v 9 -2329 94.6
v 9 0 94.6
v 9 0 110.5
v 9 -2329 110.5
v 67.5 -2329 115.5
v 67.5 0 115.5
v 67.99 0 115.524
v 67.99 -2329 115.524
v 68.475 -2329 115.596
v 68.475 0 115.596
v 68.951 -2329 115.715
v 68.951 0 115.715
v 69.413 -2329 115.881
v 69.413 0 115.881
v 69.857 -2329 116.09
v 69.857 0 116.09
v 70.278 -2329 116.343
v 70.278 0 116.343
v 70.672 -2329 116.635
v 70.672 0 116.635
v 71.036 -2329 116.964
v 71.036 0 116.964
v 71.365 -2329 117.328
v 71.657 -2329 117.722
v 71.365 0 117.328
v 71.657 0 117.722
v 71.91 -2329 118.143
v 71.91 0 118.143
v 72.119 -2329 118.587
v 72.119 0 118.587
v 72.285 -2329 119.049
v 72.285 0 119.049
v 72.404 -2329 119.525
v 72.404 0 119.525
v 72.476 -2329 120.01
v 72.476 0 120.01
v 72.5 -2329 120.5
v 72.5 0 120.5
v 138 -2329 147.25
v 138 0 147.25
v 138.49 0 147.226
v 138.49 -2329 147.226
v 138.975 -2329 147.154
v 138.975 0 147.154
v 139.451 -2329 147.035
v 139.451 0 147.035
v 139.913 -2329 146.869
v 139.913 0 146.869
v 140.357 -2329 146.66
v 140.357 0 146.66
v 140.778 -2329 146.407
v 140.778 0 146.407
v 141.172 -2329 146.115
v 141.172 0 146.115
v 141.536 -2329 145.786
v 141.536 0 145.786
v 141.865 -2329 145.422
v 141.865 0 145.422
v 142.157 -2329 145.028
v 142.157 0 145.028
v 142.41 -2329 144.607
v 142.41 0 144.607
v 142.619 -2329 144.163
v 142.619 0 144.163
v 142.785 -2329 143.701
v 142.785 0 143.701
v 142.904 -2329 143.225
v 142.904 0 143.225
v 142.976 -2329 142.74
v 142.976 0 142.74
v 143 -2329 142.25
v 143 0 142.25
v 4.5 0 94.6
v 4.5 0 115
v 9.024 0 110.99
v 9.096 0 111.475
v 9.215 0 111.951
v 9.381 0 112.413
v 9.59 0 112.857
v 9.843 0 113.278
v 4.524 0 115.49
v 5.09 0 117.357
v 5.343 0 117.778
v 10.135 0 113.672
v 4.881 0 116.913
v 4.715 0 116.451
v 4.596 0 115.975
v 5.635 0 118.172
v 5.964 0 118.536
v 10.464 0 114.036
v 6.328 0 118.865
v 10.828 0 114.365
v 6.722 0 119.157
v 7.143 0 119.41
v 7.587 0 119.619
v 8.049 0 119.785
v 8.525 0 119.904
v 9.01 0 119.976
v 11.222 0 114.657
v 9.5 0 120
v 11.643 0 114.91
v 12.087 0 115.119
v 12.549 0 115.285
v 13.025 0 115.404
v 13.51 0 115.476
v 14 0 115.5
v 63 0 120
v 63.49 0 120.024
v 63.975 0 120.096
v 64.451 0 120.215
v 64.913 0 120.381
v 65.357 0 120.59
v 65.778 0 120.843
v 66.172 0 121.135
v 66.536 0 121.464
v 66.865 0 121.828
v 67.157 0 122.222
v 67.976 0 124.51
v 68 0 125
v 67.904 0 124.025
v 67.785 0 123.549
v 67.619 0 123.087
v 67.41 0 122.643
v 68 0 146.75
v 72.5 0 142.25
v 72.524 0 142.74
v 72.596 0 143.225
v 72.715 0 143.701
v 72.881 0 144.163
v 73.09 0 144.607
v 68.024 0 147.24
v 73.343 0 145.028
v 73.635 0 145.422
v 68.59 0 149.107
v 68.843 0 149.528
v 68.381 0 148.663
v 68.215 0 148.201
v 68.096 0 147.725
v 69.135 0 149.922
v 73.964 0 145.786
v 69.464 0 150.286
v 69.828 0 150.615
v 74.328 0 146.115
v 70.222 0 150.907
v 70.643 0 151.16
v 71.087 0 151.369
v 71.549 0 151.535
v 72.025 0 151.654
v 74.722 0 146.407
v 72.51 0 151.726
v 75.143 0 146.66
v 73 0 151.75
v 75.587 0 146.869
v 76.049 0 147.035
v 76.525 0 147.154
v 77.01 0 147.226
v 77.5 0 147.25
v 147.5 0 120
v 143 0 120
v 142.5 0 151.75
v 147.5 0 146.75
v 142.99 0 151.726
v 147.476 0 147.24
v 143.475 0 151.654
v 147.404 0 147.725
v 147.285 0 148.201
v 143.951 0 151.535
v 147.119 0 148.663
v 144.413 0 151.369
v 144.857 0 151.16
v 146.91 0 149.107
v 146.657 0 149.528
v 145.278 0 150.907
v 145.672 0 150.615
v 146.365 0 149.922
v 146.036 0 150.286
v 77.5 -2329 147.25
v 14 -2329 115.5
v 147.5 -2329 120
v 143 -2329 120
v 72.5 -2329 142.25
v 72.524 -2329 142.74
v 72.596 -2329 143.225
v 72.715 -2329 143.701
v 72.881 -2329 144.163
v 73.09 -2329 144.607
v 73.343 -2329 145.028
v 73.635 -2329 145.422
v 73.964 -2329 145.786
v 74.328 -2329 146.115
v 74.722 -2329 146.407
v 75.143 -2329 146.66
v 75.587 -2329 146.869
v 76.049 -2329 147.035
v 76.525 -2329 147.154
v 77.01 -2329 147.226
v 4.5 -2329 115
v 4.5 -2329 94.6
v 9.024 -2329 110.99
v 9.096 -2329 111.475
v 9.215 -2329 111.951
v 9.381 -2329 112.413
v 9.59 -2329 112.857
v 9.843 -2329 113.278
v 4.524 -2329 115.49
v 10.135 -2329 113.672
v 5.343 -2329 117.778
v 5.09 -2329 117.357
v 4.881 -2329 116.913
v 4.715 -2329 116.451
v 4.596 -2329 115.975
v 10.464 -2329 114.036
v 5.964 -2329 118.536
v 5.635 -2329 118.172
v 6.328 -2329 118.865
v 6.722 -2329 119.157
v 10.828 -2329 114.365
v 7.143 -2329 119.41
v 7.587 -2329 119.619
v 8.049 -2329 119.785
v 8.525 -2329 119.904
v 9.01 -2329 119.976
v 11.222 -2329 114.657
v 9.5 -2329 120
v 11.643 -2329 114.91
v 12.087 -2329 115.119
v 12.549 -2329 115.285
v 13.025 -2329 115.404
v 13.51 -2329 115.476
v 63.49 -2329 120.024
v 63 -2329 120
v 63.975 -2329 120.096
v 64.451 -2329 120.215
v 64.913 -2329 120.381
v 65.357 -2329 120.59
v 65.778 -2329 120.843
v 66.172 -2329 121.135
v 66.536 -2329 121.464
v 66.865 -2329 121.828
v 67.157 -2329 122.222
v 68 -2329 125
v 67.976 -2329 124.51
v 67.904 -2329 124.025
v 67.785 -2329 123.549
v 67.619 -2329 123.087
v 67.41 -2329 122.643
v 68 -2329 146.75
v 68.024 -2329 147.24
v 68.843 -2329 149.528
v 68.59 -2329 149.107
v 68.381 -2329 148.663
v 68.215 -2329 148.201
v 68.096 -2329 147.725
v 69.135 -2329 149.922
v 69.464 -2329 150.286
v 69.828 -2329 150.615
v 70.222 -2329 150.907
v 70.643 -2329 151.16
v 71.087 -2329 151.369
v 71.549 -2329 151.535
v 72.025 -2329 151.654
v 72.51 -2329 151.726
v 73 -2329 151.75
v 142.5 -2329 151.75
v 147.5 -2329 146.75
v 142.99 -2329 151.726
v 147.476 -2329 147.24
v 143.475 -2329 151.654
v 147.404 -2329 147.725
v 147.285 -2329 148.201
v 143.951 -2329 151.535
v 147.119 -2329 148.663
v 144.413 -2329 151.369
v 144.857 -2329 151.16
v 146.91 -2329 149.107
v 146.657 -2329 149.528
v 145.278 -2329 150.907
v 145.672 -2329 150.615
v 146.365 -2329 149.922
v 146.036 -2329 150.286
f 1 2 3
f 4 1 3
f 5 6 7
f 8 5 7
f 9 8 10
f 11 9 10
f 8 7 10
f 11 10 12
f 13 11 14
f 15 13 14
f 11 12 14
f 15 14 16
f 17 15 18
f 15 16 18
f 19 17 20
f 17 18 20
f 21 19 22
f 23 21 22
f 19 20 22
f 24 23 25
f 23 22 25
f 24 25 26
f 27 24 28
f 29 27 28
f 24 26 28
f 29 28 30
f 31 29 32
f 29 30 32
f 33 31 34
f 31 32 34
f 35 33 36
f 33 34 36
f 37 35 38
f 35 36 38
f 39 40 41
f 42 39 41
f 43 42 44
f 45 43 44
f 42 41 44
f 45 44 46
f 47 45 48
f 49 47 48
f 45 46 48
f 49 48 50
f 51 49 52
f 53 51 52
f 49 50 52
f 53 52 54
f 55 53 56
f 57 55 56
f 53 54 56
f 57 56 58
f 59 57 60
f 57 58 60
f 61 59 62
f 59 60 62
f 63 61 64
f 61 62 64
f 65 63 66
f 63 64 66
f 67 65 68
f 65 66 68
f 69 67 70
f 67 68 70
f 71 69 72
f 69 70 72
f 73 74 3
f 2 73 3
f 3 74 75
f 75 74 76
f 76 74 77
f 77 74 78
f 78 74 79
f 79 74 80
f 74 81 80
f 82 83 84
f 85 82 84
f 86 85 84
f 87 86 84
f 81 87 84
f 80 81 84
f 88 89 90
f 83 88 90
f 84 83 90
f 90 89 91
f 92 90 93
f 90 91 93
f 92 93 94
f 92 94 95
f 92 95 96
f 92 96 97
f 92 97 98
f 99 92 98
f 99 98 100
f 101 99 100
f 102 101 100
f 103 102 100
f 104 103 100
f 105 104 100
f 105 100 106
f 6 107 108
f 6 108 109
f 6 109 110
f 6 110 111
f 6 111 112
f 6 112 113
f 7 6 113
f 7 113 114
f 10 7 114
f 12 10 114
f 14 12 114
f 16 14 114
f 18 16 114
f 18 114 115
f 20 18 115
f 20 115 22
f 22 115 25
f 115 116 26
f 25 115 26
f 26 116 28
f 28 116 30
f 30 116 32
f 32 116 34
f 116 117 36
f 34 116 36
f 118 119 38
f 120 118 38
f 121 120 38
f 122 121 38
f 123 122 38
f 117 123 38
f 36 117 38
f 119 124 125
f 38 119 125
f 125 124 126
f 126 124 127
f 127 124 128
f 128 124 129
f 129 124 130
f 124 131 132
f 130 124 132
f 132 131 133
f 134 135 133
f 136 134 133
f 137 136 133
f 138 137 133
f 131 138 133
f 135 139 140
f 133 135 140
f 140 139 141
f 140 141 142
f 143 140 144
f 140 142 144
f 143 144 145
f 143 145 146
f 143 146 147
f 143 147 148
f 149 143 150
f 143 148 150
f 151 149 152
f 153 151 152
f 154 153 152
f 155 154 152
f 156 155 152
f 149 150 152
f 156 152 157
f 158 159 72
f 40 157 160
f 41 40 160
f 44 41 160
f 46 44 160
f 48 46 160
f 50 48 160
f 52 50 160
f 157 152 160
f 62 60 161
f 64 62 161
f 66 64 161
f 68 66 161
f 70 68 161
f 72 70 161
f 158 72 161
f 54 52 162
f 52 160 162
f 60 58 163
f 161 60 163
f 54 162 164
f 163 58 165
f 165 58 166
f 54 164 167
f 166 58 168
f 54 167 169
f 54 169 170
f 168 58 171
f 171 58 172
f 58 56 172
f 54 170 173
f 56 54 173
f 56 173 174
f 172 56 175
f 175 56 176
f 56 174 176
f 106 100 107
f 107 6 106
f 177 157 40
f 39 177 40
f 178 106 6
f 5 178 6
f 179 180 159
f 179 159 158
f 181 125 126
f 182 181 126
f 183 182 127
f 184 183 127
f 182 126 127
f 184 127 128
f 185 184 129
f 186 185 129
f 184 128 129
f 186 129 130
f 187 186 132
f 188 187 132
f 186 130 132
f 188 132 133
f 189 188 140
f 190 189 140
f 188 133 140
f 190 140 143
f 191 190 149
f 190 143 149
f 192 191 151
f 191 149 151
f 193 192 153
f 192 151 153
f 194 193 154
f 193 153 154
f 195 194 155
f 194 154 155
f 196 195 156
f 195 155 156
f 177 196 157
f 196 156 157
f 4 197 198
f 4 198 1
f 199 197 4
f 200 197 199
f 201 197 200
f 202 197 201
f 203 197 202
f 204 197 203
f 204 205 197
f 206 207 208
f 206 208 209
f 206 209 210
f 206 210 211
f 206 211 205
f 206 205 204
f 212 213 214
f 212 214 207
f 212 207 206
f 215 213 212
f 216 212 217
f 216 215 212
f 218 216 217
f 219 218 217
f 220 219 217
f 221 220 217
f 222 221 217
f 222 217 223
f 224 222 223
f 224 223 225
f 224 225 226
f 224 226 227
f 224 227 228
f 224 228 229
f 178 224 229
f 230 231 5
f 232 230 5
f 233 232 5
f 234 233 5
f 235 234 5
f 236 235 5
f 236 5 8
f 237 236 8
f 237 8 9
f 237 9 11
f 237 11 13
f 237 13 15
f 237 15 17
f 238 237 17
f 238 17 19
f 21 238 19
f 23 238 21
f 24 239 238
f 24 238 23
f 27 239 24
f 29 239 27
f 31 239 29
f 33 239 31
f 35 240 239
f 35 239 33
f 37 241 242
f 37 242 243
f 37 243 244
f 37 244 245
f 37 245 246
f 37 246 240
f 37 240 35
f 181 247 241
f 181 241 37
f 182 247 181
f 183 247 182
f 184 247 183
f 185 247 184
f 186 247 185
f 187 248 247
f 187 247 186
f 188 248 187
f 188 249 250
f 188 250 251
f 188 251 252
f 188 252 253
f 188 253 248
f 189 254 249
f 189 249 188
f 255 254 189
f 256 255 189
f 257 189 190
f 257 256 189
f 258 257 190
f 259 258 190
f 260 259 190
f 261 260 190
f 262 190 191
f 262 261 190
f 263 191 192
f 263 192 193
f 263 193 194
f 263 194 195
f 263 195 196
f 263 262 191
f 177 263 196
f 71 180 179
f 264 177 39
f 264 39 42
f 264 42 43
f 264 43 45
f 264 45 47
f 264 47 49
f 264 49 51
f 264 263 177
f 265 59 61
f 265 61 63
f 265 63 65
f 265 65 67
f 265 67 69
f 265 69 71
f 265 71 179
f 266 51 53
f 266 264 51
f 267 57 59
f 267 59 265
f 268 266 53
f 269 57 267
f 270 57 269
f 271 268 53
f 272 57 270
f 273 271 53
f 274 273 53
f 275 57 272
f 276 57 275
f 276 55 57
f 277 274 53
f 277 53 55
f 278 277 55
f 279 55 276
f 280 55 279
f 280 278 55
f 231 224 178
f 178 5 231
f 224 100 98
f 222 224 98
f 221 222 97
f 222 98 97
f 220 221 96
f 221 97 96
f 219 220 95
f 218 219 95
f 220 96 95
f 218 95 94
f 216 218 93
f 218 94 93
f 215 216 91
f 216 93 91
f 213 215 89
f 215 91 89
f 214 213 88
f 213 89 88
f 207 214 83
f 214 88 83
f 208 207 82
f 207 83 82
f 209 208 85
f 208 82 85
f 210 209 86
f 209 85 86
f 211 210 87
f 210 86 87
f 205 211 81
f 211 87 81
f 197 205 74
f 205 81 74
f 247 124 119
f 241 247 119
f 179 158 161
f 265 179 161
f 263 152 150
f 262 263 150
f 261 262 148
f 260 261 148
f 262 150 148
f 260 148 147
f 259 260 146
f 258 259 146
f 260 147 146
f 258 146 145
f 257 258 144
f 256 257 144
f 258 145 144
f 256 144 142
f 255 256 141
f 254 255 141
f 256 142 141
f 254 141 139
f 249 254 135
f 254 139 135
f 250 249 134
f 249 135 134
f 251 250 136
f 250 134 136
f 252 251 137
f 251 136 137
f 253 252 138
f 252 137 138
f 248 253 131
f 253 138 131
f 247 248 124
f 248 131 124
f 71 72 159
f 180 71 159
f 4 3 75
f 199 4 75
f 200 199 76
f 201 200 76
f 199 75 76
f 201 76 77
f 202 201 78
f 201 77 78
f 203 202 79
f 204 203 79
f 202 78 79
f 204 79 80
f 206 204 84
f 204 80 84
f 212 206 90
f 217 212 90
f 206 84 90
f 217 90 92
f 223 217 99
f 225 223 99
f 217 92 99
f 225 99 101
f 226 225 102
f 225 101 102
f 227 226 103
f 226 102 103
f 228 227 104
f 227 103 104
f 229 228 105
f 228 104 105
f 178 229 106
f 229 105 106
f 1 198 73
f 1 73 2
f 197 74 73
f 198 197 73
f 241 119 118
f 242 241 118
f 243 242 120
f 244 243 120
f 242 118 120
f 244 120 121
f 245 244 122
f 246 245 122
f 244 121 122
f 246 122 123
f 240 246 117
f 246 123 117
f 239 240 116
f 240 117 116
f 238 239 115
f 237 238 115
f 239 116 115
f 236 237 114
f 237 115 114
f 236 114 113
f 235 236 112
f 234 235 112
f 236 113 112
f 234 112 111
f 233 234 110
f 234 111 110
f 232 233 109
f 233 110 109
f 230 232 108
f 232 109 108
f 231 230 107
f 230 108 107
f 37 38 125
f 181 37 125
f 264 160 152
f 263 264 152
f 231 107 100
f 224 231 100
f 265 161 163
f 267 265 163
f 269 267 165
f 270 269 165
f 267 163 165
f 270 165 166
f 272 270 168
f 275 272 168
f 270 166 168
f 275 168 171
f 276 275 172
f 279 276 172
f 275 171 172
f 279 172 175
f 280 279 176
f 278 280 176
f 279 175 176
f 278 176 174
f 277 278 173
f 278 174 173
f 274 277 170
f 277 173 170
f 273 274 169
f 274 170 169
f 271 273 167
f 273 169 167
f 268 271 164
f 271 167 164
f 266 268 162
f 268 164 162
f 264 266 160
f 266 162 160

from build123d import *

# Parameters (mm, degrees)
F1_DEPTH = 2329


with BuildPart() as f1:
    # F0 (on Front) → F1 (new body)
    with BuildSketch(Plane.XZ):
        with BuildLine():
            Line((147.5, 120), (147.5, 146.75))
            ThreePointArc((147.5, 146.75), (146.035534, 150.285534), (142.5, 151.75))
            Line((142.5, 151.75), (73, 151.75))
            ThreePointArc((73, 151.75), (69.464466, 150.285534), (68, 146.75))
            Line((68, 146.75), (68, 125))
            ThreePointArc((68, 125), (66.535534, 121.464466), (63, 120))
            Line((63, 120), (9.5, 120))
            ThreePointArc((9.5, 120), (5.964466, 118.535534), (4.5, 115))
            Line((4.5, 115), (4.5, 94.6))
            Line((4.5, 94.6), (9, 94.6))
            Line((9, 94.6), (9, 110.5))
            ThreePointArc((9, 110.5), (10.464466, 114.035534), (14, 115.5))
            Line((14, 115.5), (67.5, 115.5))
            ThreePointArc((67.5, 115.5), (71.035534, 116.964466), (72.5, 120.5))
            Line((72.5, 120.5), (72.5, 142.25))
            ThreePointArc((72.5, 142.25), (73.964466, 145.785534), (77.5, 147.25))
            Line((77.5, 147.25), (138, 147.25))
            ThreePointArc((138, 147.25), (141.535534, 145.785534), (143, 142.25))
            Line((143, 142.25), (143, 120))
            Line((143, 120), (147.5, 120))
        make_face()
    extrude(amount=F1_DEPTH)


solid = f1.part
